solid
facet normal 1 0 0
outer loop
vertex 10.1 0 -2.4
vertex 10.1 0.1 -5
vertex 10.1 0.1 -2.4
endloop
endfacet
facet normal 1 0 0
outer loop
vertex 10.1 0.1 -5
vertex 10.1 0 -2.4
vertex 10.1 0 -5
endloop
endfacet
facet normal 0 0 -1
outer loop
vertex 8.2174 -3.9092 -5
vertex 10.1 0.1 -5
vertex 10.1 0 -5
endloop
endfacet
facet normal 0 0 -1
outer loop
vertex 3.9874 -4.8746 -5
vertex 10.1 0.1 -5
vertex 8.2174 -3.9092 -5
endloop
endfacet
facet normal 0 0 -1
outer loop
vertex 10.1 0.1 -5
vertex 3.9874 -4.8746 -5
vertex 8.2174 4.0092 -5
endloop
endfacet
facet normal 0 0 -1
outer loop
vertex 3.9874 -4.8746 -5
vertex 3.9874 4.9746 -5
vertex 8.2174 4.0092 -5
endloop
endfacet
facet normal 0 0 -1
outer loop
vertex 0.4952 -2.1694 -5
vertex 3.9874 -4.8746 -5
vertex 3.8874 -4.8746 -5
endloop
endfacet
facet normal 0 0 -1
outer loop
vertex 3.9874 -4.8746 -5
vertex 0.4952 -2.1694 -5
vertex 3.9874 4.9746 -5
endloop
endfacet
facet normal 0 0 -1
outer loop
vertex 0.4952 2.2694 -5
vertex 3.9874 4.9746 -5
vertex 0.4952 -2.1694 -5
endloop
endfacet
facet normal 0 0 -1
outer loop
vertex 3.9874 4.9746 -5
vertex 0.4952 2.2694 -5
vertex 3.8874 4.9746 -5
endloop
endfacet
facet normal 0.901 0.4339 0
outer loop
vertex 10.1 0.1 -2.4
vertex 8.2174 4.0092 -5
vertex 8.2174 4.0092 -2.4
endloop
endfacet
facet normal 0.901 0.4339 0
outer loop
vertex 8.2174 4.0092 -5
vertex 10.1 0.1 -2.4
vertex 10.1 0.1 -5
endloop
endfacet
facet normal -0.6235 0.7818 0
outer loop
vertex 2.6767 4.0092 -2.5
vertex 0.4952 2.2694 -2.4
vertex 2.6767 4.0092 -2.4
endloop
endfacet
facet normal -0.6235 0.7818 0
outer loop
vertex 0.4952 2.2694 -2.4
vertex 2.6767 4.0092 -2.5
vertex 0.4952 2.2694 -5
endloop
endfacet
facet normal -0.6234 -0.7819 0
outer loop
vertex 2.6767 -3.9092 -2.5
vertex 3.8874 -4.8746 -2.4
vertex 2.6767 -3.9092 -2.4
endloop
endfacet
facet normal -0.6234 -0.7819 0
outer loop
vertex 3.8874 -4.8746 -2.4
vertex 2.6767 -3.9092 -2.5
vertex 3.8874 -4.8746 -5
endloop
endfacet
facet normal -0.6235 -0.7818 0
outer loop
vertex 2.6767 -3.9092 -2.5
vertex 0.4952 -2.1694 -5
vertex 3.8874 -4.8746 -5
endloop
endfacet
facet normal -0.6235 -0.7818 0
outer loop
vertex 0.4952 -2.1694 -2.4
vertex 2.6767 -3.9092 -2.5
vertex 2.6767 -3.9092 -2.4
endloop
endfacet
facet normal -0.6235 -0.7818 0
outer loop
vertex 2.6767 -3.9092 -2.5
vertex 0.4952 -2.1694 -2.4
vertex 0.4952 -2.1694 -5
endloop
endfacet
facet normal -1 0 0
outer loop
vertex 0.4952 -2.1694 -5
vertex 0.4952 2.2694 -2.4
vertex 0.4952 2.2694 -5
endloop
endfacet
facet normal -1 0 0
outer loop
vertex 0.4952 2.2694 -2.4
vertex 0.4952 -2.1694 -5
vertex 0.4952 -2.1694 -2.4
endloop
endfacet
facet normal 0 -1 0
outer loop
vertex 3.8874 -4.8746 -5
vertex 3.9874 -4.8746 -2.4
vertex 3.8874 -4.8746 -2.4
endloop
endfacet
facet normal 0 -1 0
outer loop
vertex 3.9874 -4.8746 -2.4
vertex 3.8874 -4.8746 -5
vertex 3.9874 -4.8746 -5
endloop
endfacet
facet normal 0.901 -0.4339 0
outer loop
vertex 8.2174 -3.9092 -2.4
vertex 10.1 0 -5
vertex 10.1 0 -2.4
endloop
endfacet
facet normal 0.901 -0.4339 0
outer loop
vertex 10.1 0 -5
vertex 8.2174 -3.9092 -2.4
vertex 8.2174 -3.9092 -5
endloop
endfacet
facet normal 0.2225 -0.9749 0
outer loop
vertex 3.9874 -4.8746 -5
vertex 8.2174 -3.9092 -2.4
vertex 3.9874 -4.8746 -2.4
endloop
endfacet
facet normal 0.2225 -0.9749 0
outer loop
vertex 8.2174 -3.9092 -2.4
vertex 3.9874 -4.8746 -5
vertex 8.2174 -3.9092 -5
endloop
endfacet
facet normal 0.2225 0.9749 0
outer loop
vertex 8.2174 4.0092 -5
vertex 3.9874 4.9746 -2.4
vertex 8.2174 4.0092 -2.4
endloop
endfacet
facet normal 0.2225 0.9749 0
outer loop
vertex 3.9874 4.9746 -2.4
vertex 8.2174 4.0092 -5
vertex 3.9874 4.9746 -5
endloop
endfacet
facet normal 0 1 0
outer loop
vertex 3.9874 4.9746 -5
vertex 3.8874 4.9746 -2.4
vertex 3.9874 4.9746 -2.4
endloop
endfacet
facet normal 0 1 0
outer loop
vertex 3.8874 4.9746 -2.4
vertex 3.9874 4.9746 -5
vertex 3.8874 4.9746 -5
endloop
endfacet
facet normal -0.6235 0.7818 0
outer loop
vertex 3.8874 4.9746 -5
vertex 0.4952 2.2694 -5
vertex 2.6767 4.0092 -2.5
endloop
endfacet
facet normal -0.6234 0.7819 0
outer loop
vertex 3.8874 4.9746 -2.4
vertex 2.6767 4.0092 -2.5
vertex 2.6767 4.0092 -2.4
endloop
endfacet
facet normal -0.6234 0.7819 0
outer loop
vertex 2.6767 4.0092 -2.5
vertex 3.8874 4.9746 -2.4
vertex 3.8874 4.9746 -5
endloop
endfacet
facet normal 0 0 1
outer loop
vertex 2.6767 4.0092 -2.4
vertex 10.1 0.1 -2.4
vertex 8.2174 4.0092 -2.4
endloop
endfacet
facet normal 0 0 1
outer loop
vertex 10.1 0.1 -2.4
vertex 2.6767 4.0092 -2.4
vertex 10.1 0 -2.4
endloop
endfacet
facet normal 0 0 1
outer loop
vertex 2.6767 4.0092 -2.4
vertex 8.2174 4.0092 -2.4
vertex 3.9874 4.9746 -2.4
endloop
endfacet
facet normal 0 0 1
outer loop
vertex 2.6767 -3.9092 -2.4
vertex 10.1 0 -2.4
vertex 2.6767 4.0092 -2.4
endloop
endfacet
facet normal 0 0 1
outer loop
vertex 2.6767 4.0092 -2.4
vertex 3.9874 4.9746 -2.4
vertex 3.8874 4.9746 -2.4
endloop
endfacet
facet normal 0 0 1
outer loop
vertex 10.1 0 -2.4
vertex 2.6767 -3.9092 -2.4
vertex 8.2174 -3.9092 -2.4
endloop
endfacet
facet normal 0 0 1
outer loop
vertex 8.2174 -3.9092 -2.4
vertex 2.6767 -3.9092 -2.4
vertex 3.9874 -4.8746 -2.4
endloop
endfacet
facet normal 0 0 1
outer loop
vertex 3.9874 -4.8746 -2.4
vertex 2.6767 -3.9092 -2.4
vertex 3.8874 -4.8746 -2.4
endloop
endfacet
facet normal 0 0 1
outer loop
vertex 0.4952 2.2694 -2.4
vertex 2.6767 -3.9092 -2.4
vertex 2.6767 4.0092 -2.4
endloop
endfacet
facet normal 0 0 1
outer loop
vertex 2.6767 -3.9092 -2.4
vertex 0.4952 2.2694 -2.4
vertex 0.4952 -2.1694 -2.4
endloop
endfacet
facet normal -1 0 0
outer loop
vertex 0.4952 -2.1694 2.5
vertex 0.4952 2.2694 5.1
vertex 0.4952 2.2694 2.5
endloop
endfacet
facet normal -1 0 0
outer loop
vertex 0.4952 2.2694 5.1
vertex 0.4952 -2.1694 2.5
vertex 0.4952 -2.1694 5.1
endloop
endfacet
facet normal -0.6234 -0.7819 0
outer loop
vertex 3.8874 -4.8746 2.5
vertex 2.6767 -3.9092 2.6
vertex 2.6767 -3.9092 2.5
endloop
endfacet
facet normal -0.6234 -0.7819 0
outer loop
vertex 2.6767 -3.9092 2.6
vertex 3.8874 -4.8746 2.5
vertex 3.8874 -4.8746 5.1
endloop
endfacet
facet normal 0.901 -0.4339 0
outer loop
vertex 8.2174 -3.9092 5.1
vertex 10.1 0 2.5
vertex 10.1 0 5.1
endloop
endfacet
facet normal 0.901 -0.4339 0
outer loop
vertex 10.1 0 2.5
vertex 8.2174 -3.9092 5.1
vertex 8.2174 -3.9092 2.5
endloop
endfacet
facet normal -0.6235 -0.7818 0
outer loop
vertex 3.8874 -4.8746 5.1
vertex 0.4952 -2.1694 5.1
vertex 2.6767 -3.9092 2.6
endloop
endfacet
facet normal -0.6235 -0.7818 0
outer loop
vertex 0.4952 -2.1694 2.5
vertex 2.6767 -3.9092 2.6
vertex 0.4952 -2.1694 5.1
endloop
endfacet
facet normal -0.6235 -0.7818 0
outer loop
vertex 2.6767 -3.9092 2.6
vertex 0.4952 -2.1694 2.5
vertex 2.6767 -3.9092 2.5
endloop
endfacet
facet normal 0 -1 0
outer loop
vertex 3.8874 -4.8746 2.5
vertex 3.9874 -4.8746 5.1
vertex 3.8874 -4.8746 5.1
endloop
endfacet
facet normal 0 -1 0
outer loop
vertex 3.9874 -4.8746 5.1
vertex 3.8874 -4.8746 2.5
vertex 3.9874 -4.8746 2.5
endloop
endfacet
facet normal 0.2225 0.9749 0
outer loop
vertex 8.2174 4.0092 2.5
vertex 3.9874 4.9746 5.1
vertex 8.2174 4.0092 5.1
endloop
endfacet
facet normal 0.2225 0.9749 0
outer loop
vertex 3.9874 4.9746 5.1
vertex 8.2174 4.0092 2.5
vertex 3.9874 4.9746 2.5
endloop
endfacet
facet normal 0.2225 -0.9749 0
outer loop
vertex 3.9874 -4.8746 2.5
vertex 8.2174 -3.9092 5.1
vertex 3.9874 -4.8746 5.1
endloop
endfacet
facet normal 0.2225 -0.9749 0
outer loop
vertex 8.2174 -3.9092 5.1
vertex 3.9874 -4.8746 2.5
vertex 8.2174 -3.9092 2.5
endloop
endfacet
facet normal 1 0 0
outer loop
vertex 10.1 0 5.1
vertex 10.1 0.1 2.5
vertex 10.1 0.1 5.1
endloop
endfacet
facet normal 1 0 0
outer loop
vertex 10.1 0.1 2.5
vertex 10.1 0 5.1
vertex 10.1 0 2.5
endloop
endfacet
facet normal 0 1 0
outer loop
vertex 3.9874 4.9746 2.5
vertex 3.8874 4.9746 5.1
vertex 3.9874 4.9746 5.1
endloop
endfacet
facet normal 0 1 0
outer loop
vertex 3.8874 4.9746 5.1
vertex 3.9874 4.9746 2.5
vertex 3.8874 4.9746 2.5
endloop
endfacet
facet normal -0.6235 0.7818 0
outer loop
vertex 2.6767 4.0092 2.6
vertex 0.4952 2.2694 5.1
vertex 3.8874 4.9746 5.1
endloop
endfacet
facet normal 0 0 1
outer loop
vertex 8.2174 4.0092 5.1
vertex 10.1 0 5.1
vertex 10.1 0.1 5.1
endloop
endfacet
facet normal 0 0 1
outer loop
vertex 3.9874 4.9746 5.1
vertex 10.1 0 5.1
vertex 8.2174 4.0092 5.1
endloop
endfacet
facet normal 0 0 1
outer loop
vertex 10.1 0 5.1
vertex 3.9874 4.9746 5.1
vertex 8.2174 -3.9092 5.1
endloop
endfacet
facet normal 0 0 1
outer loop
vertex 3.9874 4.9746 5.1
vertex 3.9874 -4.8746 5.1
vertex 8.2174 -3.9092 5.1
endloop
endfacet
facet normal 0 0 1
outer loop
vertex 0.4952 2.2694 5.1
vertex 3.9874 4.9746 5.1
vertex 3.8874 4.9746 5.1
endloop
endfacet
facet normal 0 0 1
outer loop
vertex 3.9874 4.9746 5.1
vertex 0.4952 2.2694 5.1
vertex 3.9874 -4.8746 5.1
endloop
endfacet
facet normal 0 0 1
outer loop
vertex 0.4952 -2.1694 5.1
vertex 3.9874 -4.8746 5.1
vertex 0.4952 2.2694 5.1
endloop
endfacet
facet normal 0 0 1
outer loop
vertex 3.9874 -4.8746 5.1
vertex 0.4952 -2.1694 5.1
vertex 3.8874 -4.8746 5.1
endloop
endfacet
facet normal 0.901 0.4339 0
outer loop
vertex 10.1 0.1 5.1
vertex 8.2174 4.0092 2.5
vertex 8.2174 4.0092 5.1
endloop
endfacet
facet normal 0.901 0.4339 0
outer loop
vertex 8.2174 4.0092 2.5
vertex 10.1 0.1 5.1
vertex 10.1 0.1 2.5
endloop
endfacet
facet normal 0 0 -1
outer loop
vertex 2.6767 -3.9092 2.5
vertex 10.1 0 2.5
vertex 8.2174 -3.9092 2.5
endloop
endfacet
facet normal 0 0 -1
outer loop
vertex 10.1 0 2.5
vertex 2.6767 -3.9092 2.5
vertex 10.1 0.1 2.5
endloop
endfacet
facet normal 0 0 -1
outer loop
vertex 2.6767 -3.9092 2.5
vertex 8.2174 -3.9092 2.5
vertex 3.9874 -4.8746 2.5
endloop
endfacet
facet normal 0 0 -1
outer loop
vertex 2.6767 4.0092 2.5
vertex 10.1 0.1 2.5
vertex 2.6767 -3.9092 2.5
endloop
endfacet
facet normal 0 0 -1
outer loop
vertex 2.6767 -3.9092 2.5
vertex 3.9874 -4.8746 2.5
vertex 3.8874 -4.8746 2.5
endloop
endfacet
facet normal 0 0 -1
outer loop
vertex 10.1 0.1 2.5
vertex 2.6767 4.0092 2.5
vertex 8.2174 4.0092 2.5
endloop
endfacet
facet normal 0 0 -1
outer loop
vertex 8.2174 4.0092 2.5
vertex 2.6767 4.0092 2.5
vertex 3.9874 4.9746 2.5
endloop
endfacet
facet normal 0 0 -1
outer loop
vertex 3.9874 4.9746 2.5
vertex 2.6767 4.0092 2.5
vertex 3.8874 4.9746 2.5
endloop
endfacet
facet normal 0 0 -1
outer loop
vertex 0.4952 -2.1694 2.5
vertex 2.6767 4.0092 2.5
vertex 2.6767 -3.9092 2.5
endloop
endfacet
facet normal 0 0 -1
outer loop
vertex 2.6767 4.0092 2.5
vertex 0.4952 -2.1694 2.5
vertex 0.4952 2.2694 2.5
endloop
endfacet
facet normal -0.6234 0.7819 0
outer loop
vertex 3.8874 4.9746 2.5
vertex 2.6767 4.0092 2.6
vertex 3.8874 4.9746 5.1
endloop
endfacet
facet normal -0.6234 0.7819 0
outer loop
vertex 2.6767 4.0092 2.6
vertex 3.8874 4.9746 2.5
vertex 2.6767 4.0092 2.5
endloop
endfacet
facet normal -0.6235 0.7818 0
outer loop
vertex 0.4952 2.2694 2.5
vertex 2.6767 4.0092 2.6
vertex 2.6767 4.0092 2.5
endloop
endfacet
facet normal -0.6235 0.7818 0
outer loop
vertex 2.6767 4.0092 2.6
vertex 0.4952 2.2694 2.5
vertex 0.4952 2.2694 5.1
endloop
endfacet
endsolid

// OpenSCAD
$fn = 7;
minkowski() {
    cube(0.1);
    union() {
        translate([5, 0, 0]) cylinder(h=10, r=5, center=true);
        cylinder(h=5, r=10, center=true);
    }
}
